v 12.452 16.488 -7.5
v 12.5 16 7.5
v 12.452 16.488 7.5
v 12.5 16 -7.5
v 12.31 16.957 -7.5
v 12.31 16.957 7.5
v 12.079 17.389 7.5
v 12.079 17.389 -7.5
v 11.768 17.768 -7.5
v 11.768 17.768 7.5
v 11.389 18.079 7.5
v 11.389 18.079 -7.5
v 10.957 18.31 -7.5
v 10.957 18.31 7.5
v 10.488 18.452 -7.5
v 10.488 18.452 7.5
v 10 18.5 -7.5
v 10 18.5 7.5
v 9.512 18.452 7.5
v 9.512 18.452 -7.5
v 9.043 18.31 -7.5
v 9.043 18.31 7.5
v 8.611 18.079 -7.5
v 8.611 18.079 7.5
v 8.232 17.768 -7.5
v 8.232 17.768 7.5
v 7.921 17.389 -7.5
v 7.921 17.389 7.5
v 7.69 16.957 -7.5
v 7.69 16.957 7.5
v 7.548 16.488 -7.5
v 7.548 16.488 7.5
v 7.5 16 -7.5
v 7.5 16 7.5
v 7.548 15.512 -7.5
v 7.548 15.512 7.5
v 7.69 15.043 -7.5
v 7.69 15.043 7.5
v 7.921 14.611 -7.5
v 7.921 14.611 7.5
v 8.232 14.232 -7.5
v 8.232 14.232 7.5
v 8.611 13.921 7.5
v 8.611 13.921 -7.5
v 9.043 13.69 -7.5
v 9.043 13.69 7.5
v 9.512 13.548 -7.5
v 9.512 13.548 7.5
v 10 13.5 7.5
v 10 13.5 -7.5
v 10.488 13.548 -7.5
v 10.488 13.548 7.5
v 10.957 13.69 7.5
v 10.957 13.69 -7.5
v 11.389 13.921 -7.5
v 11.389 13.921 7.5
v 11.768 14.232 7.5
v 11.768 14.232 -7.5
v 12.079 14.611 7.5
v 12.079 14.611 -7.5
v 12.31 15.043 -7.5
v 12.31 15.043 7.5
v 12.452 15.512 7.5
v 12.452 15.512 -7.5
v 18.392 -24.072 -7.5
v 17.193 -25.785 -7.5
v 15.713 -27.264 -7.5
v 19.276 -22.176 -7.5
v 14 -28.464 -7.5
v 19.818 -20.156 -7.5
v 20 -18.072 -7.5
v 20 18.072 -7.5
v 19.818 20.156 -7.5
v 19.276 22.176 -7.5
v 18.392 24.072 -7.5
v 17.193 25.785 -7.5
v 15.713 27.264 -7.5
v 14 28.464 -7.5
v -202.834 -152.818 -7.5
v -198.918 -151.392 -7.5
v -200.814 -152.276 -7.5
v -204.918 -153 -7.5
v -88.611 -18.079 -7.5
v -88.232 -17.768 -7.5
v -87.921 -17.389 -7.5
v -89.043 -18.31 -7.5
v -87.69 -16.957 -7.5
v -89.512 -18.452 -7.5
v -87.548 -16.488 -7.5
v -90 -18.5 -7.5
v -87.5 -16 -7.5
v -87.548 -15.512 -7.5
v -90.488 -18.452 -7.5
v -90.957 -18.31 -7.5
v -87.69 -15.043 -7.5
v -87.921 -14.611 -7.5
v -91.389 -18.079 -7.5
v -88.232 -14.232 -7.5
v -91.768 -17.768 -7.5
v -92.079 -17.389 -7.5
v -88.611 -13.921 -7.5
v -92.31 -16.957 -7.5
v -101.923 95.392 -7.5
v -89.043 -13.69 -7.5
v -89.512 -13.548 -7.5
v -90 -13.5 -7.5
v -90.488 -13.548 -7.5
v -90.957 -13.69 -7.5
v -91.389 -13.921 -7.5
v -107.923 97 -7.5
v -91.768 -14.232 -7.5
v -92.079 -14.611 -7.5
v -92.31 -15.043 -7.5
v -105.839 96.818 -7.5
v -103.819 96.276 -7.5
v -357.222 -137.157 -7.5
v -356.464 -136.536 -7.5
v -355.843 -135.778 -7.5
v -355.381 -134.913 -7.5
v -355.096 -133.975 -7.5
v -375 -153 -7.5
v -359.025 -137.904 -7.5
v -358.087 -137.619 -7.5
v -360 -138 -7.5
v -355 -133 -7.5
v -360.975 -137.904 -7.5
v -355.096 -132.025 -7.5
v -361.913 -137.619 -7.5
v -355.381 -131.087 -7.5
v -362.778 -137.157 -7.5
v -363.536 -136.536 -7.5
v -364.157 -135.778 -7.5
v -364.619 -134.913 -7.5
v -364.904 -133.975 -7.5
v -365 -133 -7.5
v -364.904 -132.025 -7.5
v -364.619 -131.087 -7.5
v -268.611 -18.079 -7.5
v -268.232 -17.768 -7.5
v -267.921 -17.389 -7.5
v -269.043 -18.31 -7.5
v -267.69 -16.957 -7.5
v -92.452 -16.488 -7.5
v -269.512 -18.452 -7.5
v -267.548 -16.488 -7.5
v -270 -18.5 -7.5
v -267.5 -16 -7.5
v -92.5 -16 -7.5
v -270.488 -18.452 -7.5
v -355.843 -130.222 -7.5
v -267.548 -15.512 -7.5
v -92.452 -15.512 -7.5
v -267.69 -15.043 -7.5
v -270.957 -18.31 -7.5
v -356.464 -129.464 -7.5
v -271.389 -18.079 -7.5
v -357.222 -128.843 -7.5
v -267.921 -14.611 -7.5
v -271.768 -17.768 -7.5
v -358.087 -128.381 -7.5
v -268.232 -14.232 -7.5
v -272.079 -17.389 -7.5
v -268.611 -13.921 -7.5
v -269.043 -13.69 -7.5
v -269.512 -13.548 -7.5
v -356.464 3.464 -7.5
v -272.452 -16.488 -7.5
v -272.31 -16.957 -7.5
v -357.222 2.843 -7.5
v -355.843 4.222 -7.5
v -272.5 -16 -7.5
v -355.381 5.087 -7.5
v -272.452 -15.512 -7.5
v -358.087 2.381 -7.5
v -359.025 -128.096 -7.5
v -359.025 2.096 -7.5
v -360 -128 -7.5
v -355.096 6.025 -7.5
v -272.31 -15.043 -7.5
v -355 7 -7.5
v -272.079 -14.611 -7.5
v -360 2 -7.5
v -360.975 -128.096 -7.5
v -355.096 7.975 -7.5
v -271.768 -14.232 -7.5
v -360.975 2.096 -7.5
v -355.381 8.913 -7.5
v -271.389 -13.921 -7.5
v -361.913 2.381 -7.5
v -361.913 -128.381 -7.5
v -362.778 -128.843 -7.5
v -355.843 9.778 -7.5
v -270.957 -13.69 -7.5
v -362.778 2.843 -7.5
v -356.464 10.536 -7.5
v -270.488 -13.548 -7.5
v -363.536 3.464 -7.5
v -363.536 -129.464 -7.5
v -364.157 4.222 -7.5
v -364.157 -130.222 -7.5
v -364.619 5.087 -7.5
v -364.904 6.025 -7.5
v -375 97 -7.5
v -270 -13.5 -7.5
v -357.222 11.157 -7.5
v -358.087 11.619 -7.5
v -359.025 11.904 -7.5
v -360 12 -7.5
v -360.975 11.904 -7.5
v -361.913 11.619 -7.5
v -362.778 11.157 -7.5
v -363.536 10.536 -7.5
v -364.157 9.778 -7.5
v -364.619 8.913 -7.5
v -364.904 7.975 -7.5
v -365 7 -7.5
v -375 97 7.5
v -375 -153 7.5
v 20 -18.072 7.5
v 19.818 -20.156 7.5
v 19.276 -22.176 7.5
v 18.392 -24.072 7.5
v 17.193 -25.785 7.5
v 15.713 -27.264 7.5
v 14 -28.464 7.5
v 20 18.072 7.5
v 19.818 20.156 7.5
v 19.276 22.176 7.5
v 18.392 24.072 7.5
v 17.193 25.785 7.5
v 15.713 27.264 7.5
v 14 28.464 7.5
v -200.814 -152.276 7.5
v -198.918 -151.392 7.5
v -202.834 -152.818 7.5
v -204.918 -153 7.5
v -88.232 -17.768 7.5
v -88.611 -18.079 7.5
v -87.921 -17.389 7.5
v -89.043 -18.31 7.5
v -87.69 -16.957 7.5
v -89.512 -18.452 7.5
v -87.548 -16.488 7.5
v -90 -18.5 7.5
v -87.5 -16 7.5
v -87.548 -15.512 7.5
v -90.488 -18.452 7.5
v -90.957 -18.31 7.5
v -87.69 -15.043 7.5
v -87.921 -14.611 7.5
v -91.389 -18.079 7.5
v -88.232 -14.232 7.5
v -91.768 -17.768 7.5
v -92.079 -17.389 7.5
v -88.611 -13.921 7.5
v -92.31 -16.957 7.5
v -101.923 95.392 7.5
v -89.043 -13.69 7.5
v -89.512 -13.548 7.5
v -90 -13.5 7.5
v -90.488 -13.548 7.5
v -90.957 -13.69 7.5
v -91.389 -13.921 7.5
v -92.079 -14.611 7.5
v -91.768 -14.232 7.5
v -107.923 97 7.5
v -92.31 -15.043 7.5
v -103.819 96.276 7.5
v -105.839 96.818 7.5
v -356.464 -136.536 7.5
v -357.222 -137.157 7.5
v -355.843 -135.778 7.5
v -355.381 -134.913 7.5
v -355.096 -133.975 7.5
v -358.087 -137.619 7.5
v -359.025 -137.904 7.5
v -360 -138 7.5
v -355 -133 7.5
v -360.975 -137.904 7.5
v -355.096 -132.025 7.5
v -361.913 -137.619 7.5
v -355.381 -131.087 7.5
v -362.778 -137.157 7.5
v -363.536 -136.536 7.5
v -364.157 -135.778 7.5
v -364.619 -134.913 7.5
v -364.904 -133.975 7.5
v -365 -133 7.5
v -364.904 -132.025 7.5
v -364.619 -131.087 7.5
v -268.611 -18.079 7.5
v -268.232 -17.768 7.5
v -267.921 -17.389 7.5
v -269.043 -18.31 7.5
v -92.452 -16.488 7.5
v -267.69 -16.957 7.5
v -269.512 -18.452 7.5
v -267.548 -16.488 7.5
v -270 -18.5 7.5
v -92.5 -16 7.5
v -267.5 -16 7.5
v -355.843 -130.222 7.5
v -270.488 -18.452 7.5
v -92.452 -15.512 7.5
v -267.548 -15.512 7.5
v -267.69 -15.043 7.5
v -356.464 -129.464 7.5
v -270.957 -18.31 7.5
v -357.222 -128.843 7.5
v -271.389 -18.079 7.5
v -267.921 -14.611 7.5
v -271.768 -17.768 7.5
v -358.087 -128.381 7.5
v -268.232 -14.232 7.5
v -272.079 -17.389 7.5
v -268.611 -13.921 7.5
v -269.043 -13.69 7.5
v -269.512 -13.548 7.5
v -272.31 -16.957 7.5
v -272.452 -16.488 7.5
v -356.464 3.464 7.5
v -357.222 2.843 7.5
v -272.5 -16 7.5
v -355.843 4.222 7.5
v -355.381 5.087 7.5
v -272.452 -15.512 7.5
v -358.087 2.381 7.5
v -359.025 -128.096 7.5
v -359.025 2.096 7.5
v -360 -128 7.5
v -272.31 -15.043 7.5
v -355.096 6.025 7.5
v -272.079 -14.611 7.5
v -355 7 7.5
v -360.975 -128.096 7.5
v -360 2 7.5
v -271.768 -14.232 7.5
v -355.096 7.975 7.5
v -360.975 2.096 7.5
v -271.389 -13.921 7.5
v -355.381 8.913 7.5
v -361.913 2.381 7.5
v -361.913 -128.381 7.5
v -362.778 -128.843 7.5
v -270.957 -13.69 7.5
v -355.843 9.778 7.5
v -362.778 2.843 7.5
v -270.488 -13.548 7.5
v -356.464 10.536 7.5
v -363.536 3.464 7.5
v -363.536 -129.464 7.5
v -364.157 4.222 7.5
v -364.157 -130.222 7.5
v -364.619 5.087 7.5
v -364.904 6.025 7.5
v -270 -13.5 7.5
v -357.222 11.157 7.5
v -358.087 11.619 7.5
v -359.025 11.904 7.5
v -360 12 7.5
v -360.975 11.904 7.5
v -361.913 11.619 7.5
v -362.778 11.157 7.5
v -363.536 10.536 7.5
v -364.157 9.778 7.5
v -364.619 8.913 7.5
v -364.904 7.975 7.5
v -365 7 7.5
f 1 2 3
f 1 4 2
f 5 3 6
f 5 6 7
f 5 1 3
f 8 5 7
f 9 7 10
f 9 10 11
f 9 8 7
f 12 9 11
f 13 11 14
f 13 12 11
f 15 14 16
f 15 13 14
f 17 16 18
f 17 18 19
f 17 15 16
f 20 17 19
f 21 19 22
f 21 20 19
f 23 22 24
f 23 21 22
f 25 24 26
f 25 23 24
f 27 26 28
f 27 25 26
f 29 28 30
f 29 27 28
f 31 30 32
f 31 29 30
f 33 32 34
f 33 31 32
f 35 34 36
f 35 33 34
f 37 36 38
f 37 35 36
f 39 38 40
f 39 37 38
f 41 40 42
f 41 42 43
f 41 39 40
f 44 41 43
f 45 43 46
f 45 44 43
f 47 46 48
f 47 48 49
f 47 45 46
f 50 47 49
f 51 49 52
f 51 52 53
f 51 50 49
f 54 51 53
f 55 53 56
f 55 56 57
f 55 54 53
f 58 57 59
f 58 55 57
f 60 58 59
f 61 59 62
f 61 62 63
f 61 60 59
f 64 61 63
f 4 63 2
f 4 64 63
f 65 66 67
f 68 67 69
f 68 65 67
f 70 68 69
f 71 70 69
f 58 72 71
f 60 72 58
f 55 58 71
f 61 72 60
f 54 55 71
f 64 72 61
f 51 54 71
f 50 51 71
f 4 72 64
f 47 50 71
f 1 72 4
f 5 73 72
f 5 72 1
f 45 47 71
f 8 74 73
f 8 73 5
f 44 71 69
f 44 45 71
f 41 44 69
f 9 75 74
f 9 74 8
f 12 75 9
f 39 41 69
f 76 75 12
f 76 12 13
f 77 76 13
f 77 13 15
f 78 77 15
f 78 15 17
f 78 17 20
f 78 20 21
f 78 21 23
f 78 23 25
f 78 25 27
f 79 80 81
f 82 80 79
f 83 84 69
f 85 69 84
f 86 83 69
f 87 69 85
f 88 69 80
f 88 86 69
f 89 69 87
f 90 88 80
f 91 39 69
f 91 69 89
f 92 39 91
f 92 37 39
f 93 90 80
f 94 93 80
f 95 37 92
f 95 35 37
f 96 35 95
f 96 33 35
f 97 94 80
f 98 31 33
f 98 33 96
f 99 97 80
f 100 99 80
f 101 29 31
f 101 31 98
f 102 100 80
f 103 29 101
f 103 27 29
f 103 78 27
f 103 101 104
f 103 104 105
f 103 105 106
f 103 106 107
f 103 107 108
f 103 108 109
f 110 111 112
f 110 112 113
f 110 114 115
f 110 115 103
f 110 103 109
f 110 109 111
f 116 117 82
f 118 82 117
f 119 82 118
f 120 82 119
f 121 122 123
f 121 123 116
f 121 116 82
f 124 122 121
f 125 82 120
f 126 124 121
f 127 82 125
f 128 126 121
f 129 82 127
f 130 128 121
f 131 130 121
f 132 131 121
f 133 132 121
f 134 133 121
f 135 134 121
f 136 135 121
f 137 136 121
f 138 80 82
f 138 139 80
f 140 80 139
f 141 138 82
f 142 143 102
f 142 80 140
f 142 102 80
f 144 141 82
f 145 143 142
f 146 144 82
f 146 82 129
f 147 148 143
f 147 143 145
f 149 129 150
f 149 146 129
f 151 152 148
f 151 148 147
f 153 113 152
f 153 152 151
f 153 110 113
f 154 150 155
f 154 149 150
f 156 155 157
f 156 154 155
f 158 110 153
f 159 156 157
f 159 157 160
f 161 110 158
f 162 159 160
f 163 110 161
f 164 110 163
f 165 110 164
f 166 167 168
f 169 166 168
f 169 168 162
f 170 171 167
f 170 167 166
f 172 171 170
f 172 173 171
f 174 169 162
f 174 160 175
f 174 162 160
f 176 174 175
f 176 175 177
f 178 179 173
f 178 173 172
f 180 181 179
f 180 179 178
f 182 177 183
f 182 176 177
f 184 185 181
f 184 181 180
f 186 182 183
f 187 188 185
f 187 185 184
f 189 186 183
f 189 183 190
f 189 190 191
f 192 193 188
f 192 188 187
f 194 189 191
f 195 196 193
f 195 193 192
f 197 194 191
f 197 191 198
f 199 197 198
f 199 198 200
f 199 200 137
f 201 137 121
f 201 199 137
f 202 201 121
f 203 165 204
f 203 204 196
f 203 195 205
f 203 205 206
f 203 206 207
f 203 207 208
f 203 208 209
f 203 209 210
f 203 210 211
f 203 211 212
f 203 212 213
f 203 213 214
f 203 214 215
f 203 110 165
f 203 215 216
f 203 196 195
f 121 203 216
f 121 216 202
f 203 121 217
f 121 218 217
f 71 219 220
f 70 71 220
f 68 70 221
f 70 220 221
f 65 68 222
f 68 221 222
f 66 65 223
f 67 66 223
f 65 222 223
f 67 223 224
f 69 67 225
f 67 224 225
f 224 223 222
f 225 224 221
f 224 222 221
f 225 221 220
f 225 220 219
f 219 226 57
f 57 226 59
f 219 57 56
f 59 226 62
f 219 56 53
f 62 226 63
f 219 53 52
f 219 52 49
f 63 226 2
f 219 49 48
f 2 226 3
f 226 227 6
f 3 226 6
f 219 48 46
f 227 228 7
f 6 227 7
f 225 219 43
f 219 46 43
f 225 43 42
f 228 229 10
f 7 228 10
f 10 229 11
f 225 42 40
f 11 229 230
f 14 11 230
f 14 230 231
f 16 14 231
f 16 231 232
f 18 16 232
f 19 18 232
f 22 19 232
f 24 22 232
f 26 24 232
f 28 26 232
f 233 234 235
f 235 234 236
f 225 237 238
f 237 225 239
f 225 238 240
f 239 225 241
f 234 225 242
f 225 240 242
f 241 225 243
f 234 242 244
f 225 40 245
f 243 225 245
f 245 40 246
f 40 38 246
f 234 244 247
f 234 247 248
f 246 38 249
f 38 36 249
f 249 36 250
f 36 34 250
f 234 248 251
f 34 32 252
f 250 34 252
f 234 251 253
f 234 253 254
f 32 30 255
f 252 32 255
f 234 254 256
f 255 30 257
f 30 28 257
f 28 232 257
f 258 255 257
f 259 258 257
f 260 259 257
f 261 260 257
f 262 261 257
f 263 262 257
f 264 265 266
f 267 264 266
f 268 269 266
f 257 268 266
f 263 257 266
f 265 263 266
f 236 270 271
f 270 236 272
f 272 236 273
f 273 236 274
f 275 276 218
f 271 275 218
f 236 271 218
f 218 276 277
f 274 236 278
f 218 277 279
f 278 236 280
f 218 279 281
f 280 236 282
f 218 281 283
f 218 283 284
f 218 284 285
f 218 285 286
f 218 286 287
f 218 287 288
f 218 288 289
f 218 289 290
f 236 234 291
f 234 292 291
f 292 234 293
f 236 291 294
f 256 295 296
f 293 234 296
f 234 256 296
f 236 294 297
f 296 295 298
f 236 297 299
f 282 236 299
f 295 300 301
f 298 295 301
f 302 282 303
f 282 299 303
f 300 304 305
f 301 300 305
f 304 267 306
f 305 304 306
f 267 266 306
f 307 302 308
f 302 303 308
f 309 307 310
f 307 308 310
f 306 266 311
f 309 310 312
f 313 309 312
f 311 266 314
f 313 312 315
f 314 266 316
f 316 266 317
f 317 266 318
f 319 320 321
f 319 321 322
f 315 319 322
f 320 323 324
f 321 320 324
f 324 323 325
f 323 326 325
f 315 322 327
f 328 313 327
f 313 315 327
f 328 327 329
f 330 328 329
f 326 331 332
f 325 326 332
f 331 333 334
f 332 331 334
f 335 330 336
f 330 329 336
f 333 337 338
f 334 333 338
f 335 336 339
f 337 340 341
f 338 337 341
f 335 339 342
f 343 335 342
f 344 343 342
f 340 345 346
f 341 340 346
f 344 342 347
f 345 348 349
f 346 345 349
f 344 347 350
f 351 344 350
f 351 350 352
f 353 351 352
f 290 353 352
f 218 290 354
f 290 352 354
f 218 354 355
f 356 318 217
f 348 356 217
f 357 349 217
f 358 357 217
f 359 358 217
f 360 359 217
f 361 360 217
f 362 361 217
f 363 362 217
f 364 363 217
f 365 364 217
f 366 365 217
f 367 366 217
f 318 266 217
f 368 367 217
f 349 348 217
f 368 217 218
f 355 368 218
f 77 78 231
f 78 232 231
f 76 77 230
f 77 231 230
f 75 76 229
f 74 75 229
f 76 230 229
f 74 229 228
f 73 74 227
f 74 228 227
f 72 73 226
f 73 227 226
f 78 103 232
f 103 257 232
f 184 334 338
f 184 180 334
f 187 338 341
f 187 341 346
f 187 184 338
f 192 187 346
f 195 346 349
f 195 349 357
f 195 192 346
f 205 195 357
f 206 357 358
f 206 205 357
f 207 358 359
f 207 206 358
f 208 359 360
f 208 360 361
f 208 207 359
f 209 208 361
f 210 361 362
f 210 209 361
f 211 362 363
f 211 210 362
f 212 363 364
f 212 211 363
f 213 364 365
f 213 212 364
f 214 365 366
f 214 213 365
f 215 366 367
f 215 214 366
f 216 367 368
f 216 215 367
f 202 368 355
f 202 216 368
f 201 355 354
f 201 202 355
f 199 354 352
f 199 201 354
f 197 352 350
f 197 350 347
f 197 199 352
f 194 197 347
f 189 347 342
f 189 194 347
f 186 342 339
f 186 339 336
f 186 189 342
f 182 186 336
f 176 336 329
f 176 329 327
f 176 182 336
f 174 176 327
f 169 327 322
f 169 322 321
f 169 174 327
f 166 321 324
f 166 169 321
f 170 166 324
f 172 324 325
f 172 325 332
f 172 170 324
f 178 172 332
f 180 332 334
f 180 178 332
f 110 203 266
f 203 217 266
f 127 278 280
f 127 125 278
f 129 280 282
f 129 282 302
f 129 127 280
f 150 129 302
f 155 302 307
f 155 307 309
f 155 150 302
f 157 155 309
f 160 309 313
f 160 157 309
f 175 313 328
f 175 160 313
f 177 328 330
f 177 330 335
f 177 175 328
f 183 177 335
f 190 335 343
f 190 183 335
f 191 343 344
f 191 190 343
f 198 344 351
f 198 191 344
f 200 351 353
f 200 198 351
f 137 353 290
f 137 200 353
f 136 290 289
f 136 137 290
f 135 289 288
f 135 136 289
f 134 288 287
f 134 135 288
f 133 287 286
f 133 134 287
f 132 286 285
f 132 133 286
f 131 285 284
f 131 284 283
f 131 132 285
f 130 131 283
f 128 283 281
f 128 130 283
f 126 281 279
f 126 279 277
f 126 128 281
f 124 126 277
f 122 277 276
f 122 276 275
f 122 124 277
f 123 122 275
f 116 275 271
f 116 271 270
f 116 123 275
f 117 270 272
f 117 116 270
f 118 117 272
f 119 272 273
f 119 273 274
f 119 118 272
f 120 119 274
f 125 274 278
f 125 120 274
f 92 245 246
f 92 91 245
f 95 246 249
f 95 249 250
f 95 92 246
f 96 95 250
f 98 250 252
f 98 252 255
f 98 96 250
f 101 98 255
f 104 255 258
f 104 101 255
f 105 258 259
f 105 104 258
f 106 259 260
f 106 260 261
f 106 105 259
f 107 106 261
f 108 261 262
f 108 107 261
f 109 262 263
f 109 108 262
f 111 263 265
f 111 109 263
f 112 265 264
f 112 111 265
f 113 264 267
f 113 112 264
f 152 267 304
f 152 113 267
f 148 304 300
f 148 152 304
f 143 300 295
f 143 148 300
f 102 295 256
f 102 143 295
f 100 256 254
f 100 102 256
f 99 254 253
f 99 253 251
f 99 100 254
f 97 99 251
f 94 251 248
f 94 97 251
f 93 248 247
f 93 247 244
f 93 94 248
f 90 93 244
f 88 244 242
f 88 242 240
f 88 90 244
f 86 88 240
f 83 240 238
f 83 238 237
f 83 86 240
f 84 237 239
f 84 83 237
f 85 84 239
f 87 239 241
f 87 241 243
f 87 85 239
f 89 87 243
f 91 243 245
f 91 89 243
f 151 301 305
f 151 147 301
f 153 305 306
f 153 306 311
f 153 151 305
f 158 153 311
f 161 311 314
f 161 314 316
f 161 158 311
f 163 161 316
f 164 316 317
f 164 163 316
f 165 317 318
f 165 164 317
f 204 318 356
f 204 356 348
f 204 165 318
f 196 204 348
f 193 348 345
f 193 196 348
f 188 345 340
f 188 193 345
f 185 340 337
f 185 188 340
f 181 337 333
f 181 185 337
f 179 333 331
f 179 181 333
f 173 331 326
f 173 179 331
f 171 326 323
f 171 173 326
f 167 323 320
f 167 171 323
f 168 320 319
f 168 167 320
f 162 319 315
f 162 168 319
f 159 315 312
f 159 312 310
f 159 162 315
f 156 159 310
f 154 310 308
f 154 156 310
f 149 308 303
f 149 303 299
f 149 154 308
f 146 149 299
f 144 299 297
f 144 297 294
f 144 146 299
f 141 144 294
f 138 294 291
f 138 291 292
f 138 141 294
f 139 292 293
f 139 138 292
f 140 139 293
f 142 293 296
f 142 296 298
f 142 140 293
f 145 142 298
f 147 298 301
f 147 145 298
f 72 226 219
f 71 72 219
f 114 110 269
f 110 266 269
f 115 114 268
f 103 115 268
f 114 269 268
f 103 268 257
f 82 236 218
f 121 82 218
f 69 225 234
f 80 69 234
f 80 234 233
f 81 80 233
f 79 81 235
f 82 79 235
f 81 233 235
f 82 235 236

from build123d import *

# Parameters (mm, degrees)
SKIZZE1_R                       = 2.5
SKIZZE1_R_2                     = 5
AUFSATZ_LINEAR_AUSTRAGEN1_DEPTH = 7.5


with BuildPart() as part:
    # Skizze1 → Aufsatz-Linear austragen1 (new, symmetric)
    with BuildSketch(Plane.XY):
        with BuildLine():
            Line((-204.917893678, -153), (-375, -153))
            Line((-375, -153), (-375, 97))
            Line((-375, 97), (-107.923048454, 97))
            ThreePointArc((-107.923048454, 97), (-104.817219913, 96.591109915), (-101.923048454, 95.392304845))
            Line((-101.923048454, 95.392304845), (14, 28.464101615))
            ThreePointArc((14, 28.464101615), (18.392304845, 24.07179677), (20, 18.07179677))
            Line((20, 18.07179677), (20, 15))
            Line((20, 15), (20, -18.07179677))
            ThreePointArc((20, -18.07179677), (18.392304845, -24.07179677), (14, -28.464101615))
            Line((14, -28.464101615), (-198.917893678, -151.392304845))
            ThreePointArc((-198.917893678, -151.392304845), (-201.812065137, -152.591109915), (-204.917893678, -153))
        make_face()
        with Locations((-270, -16)):
            Circle(SKIZZE1_R, mode=Mode.SUBTRACT)
        with Locations((-360, 7)):
            Circle(SKIZZE1_R_2, mode=Mode.SUBTRACT)
        with Locations((-360, -133)):
            Circle(SKIZZE1_R_2, mode=Mode.SUBTRACT)
        with Locations((-90, -16)):
            Circle(SKIZZE1_R, mode=Mode.SUBTRACT)
        with Locations((10, 16)):
            Circle(SKIZZE1_R, mode=Mode.SUBTRACT)
    extrude(amount=AUFSATZ_LINEAR_AUSTRAGEN1_DEPTH, both=True)


solid = part.part
